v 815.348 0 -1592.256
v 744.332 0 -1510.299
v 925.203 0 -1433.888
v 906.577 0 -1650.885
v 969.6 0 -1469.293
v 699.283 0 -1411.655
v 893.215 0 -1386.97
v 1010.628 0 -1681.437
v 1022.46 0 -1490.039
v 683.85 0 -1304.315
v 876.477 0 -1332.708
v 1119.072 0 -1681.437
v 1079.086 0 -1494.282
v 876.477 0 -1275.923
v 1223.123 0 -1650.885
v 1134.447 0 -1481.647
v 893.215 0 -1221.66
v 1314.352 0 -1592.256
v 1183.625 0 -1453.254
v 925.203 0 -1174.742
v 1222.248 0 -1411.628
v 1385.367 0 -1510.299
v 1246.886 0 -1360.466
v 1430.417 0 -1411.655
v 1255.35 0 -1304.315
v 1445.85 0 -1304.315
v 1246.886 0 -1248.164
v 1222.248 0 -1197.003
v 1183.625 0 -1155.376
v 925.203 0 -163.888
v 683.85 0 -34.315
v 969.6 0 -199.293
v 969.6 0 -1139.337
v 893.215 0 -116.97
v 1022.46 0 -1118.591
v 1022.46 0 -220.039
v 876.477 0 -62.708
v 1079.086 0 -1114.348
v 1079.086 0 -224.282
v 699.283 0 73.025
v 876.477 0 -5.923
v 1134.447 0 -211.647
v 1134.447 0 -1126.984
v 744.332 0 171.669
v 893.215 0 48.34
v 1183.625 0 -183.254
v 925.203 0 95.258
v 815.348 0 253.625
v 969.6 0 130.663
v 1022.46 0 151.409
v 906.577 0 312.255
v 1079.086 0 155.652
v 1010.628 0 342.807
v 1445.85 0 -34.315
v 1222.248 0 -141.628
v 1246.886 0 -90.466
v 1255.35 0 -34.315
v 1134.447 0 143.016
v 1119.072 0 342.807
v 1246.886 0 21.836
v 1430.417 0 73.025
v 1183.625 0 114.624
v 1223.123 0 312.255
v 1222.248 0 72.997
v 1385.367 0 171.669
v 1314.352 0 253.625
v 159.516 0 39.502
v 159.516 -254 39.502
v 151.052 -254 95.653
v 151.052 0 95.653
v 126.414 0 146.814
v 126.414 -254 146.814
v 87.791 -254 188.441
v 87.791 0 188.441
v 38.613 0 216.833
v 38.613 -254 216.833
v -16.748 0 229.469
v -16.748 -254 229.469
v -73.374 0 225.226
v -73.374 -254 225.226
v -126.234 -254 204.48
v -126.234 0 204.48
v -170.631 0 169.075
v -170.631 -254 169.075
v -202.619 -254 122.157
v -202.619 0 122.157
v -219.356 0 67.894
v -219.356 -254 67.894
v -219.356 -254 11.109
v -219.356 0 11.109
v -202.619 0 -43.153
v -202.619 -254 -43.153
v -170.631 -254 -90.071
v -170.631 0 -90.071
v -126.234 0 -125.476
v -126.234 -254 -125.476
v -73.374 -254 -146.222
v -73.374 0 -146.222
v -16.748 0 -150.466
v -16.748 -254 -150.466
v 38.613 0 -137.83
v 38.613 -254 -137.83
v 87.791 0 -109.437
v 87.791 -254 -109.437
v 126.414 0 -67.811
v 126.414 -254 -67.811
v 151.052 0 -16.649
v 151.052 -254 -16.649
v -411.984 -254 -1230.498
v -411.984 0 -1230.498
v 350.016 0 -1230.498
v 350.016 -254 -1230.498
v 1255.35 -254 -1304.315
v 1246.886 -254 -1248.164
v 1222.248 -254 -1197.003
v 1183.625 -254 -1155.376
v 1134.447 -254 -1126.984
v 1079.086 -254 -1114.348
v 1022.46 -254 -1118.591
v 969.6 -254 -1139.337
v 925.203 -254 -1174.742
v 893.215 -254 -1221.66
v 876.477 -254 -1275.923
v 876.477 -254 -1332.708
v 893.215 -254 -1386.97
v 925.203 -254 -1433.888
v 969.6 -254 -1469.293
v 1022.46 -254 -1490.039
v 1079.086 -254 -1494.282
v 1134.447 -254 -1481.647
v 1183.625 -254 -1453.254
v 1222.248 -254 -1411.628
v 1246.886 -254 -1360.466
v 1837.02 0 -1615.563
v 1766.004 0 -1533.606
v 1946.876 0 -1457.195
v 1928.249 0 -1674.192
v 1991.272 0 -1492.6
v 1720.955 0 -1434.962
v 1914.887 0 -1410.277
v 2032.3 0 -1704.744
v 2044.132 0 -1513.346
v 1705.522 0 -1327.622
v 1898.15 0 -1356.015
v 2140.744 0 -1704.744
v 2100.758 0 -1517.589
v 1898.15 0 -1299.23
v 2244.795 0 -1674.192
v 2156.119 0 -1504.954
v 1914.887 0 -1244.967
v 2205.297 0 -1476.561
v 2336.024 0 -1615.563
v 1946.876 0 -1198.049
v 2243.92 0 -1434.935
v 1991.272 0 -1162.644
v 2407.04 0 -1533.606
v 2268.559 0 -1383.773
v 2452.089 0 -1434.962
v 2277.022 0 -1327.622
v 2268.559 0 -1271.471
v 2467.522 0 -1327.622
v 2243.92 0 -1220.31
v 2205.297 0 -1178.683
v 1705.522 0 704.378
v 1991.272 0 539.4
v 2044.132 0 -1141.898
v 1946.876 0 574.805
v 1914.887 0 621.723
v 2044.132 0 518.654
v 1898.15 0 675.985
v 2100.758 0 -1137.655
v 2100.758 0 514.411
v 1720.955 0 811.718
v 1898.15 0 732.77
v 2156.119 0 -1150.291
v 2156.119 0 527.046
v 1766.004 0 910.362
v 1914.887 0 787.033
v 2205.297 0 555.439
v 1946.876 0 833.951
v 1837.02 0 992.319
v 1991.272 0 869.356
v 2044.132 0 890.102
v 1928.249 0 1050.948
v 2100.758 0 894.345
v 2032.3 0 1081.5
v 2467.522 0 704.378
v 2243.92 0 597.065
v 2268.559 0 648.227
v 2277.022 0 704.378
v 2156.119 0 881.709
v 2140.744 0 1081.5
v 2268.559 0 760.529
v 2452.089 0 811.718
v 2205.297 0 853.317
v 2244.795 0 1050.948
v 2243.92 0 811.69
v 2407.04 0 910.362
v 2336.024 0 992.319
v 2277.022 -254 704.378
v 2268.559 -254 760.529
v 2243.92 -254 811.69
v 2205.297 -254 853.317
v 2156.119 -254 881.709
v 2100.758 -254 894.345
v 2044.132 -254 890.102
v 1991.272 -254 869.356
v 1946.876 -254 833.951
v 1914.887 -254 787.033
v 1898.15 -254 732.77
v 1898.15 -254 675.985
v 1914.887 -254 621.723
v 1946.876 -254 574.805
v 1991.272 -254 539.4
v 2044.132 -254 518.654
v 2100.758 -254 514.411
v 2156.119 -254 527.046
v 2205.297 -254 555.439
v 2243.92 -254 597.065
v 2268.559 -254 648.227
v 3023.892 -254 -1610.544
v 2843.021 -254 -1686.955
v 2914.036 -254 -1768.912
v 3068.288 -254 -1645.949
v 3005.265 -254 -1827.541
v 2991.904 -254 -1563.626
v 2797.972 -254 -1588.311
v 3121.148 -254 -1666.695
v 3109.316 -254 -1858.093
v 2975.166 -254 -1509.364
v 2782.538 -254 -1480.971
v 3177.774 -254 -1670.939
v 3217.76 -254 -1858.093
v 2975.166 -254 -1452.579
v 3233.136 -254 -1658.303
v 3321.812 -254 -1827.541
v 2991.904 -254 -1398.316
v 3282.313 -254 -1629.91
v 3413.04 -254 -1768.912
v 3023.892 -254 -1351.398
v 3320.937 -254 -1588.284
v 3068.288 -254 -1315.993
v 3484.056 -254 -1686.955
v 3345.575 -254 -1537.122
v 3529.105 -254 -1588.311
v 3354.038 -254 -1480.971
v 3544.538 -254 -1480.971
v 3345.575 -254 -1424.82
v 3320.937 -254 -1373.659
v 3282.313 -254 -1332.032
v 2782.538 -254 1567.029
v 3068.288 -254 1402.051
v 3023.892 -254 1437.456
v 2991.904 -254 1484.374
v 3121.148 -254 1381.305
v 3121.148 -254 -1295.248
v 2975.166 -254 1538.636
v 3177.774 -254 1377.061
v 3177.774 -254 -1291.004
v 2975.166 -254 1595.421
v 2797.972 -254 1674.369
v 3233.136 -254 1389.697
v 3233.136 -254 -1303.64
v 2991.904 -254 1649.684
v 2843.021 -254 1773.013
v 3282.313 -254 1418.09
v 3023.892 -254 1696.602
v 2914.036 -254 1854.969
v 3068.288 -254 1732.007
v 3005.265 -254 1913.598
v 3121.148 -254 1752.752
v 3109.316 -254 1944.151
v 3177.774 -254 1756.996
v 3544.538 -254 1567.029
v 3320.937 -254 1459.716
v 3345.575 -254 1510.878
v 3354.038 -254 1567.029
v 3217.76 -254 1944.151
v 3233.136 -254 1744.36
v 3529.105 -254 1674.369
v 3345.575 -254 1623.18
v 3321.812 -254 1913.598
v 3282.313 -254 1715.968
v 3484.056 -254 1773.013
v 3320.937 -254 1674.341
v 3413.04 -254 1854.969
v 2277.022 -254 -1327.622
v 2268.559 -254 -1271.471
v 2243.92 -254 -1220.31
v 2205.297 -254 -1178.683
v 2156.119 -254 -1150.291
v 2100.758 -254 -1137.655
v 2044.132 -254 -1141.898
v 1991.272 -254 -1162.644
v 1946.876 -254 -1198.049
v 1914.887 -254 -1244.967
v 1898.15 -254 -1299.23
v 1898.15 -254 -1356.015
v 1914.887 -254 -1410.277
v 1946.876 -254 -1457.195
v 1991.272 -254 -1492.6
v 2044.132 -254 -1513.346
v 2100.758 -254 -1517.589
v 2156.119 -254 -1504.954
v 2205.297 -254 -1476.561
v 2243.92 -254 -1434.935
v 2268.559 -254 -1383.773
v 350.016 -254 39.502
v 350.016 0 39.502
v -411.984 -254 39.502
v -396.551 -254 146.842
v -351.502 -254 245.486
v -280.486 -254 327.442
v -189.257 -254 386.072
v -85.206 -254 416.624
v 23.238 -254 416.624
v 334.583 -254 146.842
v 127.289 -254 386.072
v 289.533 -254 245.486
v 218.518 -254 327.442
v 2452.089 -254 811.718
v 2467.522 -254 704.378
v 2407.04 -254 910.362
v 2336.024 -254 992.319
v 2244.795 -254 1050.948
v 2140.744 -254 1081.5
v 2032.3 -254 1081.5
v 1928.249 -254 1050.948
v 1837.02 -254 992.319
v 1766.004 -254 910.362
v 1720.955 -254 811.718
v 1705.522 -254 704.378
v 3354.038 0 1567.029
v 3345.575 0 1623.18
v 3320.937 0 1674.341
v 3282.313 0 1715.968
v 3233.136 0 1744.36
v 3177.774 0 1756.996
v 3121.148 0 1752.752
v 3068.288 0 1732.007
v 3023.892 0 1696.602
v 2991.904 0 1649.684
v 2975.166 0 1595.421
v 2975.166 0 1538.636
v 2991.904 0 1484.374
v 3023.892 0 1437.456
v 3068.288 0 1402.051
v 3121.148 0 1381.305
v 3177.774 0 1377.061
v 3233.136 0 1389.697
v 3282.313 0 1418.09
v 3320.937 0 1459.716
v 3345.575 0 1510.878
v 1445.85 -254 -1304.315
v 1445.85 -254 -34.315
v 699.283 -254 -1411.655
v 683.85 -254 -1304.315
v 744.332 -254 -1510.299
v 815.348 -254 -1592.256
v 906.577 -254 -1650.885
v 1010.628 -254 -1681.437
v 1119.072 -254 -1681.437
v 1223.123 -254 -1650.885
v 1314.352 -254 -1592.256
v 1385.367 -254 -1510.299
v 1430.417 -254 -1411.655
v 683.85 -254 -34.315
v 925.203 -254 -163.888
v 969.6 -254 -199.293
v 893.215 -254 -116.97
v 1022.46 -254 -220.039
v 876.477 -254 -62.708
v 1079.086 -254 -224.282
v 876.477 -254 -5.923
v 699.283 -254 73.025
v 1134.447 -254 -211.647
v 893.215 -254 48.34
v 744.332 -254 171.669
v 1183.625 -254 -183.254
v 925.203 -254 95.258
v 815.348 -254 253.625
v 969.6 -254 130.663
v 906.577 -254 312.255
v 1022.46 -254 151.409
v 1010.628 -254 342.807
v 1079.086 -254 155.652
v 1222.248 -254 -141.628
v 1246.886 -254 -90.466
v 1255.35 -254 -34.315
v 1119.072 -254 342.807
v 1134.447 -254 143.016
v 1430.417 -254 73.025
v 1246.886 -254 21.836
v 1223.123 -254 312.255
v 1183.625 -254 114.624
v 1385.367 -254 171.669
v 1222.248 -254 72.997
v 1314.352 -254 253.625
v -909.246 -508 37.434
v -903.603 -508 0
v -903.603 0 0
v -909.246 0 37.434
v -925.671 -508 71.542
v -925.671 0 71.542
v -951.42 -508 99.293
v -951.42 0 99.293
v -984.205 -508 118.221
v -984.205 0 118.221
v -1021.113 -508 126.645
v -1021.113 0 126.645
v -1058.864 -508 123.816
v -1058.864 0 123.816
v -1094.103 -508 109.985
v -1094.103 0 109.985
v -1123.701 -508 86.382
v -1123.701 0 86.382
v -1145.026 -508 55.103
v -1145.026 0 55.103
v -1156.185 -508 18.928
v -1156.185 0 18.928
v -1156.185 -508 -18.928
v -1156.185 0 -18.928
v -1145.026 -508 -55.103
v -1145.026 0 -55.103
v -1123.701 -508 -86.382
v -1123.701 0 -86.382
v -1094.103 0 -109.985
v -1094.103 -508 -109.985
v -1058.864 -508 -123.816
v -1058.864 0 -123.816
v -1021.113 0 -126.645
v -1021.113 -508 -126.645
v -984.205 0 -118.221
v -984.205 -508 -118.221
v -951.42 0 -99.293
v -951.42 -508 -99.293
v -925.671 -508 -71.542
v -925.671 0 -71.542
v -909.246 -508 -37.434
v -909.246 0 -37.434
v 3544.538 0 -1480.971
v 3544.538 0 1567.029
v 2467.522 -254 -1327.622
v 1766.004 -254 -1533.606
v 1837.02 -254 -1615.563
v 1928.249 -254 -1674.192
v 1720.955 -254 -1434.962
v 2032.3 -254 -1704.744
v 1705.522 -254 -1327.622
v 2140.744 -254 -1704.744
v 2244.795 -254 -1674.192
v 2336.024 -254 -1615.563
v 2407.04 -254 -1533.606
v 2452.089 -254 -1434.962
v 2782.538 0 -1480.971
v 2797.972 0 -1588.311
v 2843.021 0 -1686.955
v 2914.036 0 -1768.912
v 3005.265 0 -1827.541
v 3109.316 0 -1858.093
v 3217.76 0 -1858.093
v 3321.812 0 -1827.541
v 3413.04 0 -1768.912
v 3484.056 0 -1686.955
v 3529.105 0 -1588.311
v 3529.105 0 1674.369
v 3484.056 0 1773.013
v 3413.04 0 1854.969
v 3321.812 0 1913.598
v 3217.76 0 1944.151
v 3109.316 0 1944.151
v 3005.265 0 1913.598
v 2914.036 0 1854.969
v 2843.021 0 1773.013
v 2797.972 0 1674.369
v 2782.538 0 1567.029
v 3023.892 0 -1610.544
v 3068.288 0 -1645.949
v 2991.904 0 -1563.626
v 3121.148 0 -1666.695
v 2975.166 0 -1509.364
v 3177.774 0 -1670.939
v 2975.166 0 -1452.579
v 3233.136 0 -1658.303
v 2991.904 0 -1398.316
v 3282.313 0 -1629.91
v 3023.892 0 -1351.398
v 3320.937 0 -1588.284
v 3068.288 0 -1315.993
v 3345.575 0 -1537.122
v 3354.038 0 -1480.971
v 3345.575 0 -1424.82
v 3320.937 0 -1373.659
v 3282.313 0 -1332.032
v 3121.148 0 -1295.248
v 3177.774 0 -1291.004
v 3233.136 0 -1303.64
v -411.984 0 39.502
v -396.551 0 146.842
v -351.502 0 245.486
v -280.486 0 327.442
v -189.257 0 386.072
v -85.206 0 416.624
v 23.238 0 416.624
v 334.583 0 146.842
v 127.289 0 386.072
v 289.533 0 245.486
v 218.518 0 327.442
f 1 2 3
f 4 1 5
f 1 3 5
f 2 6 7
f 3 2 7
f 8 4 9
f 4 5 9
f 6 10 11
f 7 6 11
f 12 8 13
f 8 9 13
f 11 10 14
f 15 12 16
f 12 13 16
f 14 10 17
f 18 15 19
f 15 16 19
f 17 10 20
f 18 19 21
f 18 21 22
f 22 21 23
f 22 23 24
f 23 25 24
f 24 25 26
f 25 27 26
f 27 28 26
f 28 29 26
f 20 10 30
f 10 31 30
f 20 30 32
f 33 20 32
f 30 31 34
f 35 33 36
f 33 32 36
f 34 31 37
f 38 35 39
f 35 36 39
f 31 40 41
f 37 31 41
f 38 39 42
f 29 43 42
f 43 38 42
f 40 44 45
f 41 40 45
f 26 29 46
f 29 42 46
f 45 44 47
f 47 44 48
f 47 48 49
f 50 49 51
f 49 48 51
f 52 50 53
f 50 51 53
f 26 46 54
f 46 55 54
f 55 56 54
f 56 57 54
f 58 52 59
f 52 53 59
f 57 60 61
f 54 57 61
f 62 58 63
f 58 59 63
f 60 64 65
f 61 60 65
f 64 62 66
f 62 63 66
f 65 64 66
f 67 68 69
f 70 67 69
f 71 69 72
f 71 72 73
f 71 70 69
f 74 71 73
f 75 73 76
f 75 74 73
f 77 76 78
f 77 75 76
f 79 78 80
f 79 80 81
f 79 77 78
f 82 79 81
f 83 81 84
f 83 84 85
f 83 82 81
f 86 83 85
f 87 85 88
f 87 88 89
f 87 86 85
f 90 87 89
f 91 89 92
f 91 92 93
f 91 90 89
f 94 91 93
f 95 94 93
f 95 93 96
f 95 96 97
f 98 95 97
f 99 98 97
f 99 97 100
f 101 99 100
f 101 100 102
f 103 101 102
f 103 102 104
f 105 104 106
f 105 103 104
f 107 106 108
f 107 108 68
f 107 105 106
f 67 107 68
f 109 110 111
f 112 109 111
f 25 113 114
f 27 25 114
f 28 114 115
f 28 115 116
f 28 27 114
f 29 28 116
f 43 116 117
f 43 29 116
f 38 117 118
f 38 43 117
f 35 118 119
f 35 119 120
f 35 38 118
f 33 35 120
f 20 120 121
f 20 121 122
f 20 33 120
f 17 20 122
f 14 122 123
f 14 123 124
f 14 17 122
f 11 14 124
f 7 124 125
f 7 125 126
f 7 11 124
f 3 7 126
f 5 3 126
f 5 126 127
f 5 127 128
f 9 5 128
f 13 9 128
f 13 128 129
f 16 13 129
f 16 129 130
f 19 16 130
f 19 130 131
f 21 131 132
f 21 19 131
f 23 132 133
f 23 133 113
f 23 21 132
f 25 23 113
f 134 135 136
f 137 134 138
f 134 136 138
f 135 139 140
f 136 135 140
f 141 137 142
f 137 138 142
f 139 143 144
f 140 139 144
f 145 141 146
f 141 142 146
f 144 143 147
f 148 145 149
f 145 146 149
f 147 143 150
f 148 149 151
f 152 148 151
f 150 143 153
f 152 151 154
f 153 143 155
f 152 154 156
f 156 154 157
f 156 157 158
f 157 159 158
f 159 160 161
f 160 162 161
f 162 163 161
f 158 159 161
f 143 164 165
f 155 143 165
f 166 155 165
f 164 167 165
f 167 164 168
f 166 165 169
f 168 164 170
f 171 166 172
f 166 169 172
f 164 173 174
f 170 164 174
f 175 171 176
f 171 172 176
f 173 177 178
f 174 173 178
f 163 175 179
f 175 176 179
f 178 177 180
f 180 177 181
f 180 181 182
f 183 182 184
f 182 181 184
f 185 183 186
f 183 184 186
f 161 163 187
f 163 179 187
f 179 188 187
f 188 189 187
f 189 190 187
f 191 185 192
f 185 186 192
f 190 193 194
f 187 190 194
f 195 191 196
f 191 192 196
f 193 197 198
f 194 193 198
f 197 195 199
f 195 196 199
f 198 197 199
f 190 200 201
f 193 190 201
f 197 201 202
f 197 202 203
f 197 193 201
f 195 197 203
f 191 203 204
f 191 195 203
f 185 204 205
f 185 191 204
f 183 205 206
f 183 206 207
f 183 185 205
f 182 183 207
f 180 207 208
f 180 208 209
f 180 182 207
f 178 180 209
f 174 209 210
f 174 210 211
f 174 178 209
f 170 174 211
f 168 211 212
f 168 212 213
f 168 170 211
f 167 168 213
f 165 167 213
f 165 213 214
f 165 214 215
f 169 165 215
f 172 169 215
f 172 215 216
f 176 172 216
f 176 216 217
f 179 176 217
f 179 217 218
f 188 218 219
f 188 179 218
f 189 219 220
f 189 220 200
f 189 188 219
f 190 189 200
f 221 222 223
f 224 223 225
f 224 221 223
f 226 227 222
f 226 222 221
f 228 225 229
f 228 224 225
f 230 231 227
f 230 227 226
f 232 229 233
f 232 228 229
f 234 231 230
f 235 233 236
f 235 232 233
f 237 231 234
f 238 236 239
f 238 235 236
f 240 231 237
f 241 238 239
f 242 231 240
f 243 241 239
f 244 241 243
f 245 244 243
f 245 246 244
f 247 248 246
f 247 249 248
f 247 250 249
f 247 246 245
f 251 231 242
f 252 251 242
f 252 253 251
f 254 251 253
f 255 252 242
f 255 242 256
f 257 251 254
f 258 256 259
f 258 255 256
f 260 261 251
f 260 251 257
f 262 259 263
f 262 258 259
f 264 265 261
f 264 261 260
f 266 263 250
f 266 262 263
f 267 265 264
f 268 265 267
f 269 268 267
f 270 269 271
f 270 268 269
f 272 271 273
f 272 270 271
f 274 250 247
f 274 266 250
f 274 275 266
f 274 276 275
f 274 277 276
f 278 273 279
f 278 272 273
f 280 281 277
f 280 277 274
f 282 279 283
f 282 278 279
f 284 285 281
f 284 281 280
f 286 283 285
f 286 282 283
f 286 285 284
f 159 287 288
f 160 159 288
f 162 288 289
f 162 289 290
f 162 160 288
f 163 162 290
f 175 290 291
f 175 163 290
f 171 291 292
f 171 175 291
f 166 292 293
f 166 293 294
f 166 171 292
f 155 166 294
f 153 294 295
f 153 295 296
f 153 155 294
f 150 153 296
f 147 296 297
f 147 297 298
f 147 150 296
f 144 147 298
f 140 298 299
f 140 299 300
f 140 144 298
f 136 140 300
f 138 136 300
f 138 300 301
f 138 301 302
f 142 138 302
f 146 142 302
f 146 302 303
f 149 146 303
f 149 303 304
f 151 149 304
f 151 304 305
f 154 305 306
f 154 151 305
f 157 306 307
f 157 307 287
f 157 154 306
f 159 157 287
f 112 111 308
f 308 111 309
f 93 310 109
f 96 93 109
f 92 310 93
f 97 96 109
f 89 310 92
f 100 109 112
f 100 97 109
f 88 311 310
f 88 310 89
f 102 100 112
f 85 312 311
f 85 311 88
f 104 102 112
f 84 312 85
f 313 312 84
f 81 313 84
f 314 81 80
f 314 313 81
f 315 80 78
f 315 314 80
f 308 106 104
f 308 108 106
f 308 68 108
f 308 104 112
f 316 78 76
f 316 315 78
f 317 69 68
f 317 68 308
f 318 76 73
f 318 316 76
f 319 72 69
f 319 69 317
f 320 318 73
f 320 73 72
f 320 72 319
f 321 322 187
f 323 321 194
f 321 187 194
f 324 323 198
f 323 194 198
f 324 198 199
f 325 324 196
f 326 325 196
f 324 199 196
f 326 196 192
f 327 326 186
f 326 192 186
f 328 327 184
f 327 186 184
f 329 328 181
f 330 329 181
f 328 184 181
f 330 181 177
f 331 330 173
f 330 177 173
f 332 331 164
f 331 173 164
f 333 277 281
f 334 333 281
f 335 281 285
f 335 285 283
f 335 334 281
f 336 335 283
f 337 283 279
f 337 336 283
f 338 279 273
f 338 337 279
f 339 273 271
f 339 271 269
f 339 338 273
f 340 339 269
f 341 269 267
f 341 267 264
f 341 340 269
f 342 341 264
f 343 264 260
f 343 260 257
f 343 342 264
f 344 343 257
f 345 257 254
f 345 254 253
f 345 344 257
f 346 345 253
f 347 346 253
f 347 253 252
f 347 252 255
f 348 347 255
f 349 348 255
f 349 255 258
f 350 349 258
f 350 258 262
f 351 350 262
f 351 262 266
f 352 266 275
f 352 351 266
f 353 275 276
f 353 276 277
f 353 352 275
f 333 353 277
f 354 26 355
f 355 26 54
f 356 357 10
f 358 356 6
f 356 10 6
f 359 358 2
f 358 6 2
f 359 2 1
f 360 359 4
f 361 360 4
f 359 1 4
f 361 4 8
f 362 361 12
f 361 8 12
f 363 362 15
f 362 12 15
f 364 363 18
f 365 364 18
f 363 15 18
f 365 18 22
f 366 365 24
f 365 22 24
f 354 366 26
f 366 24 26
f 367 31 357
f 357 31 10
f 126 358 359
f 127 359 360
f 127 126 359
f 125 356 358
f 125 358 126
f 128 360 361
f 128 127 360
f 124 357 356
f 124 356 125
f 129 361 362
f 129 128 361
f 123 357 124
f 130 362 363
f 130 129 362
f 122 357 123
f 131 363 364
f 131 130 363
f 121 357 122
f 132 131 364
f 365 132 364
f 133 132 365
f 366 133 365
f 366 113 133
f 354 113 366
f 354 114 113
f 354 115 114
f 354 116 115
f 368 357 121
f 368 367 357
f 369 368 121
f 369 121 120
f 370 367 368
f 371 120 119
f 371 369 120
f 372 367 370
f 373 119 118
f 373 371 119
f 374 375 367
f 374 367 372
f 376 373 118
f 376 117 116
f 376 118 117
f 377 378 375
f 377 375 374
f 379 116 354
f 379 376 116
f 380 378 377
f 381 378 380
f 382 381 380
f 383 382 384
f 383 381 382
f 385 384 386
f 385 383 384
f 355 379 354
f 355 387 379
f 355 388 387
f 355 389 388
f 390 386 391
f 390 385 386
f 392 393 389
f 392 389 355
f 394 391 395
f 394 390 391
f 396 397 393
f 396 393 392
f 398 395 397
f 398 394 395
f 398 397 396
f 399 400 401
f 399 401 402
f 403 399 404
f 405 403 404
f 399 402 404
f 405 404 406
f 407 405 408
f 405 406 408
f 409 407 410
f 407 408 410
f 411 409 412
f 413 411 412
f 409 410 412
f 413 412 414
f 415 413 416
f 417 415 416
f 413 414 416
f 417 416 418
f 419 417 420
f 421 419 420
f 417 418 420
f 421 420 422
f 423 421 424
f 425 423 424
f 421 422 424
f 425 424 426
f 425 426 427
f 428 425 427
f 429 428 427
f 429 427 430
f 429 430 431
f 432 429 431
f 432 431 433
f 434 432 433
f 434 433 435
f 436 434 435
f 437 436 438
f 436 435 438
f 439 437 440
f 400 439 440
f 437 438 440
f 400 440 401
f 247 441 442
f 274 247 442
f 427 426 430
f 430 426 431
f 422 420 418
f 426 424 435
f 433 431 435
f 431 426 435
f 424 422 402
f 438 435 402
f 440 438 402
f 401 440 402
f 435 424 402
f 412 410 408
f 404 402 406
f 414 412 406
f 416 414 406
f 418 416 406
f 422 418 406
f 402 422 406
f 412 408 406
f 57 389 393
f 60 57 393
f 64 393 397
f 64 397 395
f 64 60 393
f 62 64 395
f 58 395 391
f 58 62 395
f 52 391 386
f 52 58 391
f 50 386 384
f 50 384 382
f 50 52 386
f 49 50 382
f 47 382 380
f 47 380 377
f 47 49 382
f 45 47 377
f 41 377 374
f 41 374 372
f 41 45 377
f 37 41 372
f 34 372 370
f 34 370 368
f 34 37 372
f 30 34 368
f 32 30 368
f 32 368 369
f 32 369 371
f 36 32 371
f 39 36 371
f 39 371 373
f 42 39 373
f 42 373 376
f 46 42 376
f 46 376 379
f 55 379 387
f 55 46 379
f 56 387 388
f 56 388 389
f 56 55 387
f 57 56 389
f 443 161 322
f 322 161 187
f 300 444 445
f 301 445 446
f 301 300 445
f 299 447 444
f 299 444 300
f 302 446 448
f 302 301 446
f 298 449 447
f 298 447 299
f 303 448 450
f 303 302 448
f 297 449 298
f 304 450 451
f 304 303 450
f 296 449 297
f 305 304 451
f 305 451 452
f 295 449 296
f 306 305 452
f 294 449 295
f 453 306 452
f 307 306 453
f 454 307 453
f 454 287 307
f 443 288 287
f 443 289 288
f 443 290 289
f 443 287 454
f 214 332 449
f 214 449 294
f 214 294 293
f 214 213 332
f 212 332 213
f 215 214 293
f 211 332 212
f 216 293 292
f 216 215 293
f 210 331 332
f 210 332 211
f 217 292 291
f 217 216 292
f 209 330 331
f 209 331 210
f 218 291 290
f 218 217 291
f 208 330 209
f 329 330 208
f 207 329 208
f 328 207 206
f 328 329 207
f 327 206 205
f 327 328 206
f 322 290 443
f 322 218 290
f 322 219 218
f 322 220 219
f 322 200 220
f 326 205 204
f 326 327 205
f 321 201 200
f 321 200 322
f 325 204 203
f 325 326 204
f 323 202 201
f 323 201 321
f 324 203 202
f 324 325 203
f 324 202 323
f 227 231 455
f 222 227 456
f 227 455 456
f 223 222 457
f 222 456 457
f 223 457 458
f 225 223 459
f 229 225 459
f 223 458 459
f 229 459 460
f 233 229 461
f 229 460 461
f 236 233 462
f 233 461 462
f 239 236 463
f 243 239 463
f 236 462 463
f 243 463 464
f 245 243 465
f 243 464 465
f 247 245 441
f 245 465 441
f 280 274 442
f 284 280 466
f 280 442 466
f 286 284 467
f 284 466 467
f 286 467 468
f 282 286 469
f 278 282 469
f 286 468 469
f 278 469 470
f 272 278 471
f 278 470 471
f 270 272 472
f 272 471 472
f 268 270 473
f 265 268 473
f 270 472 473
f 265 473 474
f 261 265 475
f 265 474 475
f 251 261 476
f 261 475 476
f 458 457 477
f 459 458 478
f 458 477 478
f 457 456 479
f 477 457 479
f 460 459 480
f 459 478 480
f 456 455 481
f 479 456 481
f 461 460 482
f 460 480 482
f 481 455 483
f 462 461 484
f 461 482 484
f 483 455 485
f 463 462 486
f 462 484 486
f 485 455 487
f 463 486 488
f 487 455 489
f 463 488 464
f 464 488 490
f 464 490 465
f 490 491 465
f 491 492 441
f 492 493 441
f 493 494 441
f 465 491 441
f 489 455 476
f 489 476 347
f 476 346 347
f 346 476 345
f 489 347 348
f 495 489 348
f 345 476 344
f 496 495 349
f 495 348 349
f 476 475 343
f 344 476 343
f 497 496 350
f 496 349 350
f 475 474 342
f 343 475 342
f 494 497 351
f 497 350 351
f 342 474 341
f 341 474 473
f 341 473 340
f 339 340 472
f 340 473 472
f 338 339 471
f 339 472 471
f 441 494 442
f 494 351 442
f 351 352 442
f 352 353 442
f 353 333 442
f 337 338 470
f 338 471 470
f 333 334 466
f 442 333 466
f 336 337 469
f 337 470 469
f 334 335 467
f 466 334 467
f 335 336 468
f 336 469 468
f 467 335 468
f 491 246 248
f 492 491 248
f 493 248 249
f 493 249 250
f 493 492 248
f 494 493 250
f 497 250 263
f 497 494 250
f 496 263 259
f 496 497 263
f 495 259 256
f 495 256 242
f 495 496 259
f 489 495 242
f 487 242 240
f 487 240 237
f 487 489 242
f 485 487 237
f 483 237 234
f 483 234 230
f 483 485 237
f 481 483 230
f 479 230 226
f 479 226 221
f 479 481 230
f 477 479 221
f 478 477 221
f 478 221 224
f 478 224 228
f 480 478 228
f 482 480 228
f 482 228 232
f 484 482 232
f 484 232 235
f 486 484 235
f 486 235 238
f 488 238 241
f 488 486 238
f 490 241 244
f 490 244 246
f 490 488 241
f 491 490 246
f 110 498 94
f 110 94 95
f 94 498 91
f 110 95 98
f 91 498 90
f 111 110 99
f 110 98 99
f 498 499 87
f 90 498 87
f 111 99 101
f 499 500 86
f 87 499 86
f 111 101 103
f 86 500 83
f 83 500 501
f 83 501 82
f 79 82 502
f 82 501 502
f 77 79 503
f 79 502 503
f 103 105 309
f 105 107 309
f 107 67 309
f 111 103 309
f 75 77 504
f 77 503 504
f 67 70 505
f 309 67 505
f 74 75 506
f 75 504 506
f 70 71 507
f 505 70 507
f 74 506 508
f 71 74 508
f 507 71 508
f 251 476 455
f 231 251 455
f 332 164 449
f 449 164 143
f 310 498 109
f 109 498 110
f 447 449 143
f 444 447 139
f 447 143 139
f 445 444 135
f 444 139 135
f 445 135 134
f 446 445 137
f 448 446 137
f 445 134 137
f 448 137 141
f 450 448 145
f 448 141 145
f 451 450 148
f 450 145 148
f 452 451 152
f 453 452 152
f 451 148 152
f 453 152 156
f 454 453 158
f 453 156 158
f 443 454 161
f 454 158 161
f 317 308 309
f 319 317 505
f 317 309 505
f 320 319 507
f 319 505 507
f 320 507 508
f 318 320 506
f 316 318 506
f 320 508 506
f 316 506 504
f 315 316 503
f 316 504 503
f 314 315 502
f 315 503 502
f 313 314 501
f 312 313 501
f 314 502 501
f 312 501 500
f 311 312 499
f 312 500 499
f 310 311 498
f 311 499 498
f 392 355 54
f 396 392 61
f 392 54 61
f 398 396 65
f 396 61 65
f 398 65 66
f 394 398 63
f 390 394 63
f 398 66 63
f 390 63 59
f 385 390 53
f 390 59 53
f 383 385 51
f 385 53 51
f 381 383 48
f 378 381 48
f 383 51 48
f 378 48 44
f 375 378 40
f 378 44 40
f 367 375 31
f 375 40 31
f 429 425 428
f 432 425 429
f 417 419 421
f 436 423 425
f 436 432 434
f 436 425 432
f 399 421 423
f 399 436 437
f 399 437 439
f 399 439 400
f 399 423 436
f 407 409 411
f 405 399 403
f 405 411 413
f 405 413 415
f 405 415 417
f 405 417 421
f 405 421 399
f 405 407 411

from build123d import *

# Parameters (mm, degrees)
F1_R      = 190.5
F2_DEPTH  = 254
F3_R      = 190.5
F4_DEPTH  = 254
F5_R      = 190.5
F6_DEPTH  = 254
F7_R      = 190.5
F8_DEPTH  = 254
F9_R      = 127
F10_DEPTH = 508


# Not quite as in the source:
# - a variable given as a bare number and used for a length is read in inches; the dataset says mm whatever the document's units were


with BuildPart() as f2:
    # F1 (on Front) → F2 (new body)
    with BuildSketch(Plane.XZ):
        with BuildLine():
            Line((350.0158497542, -1230.4982659221), (350.0158497542, 39.5017340779))
            ThreePointArc((350.0158497542, 39.5017340779), (-30.9841502458, 420.5017340779), (-411.9841502458, 39.5017340779))
            Line((-411.9841502458, 39.5017340779), (-411.9841502458, -1230.4982659221))
            Line((-411.9841502458, -1230.4982659221), (350.0158497542, -1230.4982659221))
        make_face()
        with Locations((-30.9841502458, 39.5017340779)):
            Circle(F1_R, mode=Mode.SUBTRACT)
    extrude(amount=F2_DEPTH)


with BuildPart() as f4:
    # F3 (on Front) → F4 (new body)
    with BuildSketch(Plane.XZ):
        with BuildLine():
            Line((1445.8497519493, -1304.3150901794), (1445.8497519493, -34.3150901794))
            ThreePointArc((1445.8497519493, -34.3150901794), (1064.8497519493, 346.6849098206), (683.8497519493, -34.3150901794))
            Line((683.8497519493, -34.3150901794), (683.8497519493, -1304.3150901794))
            ThreePointArc((683.8497519493, -1304.3150901794), (1064.8497519493, -1685.3150901794), (1445.8497519493, -1304.3150901794))
        make_face()
        with Locations((1064.8497519493, -1304.3150901794)):
            Circle(F3_R, mode=Mode.SUBTRACT)
        with Locations((1064.8497519493, -34.3150901794)):
            Circle(F3_R, mode=Mode.SUBTRACT)
    extrude(amount=F4_DEPTH)


with BuildPart() as f6:
    # F5 (on Front) → F6 (new body)
    with BuildSketch(Plane.XZ):
        with BuildLine():
            Line((2467.521941185, -1327.6220560074), (2467.521941185, 704.3779439926))
            ThreePointArc((2467.521941185, 704.3779439926), (2086.521941185, 1085.3779439926), (1705.521941185, 704.3779439926))
            Line((1705.521941185, 704.3779439926), (1705.521941185, -1327.6220560074))
            ThreePointArc((1705.521941185, -1327.6220560074), (2086.521941185, -1708.6220560074), (2467.521941185, -1327.6220560074))
        make_face()
        with Locations((2086.521941185, -1327.6220560074)):
            Circle(F5_R, mode=Mode.SUBTRACT)
        with Locations((2086.521941185, 704.3779439926)):
            Circle(F5_R, mode=Mode.SUBTRACT)
    extrude(amount=F6_DEPTH)


with BuildPart() as f8:
    # F7 (on Front) → F8 (new body)
    with BuildSketch(Plane.XZ):
        with BuildLine():
            Line((3544.5384140015, -1480.9713363647), (3544.5384140015, 1567.0286636353))
            ThreePointArc((3544.5384140015, 1567.0286636353), (3163.5384140015, 1948.0286636353), (2782.5384140015, 1567.0286636353))
            Line((2782.5384140015, 1567.0286636353), (2782.5384140015, -1480.9713363647))
            ThreePointArc((2782.5384140015, -1480.9713363647), (3163.5384140015, -1861.9713363647), (3544.5384140015, -1480.9713363647))
        make_face()
        with Locations((3163.5384140015, -1480.9713363647)):
            Circle(F7_R, mode=Mode.SUBTRACT)
        with Locations((3163.5384140015, 1567.0286636353)):
            Circle(F7_R, mode=Mode.SUBTRACT)
    extrude(amount=F8_DEPTH)


with BuildPart() as f10:
    # F9 (on Front) → F10 (new body)
    with BuildSketch(Plane.XZ):
        with Locations((-1030.6034088135, 0)):
            Circle(F9_R)
    extrude(amount=F10_DEPTH)


solid = Compound([f2.part, f4.part, f6.part, f8.part, f10.part])
